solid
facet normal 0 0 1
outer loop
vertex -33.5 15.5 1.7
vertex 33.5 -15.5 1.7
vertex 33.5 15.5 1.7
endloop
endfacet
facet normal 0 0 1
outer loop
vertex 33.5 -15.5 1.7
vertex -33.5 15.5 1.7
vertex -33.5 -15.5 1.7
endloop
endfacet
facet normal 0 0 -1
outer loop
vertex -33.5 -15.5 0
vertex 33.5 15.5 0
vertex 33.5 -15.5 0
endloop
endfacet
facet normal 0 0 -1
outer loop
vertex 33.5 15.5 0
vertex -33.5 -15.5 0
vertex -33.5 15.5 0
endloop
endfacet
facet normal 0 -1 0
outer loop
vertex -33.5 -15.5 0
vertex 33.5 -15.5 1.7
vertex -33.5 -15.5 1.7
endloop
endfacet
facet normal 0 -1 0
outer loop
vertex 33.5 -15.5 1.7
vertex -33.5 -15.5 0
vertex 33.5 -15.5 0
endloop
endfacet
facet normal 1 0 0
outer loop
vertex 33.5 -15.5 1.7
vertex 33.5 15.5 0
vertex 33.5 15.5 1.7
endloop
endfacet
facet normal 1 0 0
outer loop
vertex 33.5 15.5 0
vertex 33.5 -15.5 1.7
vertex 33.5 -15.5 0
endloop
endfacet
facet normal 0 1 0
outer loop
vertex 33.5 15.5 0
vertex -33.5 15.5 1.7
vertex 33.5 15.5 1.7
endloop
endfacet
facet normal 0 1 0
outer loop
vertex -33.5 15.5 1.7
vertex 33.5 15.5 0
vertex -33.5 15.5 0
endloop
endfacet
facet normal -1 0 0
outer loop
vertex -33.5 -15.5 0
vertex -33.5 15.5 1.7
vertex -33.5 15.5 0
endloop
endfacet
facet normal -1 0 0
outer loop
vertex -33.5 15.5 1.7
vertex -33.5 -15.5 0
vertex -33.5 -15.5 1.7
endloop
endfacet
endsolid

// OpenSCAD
$fn = 64;

board_x = 67.0;
board_y = 31.0;
board_th = 1.7;

color([0.05, 0.45, 0.12])
translate([-board_x/2, -board_y/2, 0])
cube([board_x, board_y, board_th], center=false);
